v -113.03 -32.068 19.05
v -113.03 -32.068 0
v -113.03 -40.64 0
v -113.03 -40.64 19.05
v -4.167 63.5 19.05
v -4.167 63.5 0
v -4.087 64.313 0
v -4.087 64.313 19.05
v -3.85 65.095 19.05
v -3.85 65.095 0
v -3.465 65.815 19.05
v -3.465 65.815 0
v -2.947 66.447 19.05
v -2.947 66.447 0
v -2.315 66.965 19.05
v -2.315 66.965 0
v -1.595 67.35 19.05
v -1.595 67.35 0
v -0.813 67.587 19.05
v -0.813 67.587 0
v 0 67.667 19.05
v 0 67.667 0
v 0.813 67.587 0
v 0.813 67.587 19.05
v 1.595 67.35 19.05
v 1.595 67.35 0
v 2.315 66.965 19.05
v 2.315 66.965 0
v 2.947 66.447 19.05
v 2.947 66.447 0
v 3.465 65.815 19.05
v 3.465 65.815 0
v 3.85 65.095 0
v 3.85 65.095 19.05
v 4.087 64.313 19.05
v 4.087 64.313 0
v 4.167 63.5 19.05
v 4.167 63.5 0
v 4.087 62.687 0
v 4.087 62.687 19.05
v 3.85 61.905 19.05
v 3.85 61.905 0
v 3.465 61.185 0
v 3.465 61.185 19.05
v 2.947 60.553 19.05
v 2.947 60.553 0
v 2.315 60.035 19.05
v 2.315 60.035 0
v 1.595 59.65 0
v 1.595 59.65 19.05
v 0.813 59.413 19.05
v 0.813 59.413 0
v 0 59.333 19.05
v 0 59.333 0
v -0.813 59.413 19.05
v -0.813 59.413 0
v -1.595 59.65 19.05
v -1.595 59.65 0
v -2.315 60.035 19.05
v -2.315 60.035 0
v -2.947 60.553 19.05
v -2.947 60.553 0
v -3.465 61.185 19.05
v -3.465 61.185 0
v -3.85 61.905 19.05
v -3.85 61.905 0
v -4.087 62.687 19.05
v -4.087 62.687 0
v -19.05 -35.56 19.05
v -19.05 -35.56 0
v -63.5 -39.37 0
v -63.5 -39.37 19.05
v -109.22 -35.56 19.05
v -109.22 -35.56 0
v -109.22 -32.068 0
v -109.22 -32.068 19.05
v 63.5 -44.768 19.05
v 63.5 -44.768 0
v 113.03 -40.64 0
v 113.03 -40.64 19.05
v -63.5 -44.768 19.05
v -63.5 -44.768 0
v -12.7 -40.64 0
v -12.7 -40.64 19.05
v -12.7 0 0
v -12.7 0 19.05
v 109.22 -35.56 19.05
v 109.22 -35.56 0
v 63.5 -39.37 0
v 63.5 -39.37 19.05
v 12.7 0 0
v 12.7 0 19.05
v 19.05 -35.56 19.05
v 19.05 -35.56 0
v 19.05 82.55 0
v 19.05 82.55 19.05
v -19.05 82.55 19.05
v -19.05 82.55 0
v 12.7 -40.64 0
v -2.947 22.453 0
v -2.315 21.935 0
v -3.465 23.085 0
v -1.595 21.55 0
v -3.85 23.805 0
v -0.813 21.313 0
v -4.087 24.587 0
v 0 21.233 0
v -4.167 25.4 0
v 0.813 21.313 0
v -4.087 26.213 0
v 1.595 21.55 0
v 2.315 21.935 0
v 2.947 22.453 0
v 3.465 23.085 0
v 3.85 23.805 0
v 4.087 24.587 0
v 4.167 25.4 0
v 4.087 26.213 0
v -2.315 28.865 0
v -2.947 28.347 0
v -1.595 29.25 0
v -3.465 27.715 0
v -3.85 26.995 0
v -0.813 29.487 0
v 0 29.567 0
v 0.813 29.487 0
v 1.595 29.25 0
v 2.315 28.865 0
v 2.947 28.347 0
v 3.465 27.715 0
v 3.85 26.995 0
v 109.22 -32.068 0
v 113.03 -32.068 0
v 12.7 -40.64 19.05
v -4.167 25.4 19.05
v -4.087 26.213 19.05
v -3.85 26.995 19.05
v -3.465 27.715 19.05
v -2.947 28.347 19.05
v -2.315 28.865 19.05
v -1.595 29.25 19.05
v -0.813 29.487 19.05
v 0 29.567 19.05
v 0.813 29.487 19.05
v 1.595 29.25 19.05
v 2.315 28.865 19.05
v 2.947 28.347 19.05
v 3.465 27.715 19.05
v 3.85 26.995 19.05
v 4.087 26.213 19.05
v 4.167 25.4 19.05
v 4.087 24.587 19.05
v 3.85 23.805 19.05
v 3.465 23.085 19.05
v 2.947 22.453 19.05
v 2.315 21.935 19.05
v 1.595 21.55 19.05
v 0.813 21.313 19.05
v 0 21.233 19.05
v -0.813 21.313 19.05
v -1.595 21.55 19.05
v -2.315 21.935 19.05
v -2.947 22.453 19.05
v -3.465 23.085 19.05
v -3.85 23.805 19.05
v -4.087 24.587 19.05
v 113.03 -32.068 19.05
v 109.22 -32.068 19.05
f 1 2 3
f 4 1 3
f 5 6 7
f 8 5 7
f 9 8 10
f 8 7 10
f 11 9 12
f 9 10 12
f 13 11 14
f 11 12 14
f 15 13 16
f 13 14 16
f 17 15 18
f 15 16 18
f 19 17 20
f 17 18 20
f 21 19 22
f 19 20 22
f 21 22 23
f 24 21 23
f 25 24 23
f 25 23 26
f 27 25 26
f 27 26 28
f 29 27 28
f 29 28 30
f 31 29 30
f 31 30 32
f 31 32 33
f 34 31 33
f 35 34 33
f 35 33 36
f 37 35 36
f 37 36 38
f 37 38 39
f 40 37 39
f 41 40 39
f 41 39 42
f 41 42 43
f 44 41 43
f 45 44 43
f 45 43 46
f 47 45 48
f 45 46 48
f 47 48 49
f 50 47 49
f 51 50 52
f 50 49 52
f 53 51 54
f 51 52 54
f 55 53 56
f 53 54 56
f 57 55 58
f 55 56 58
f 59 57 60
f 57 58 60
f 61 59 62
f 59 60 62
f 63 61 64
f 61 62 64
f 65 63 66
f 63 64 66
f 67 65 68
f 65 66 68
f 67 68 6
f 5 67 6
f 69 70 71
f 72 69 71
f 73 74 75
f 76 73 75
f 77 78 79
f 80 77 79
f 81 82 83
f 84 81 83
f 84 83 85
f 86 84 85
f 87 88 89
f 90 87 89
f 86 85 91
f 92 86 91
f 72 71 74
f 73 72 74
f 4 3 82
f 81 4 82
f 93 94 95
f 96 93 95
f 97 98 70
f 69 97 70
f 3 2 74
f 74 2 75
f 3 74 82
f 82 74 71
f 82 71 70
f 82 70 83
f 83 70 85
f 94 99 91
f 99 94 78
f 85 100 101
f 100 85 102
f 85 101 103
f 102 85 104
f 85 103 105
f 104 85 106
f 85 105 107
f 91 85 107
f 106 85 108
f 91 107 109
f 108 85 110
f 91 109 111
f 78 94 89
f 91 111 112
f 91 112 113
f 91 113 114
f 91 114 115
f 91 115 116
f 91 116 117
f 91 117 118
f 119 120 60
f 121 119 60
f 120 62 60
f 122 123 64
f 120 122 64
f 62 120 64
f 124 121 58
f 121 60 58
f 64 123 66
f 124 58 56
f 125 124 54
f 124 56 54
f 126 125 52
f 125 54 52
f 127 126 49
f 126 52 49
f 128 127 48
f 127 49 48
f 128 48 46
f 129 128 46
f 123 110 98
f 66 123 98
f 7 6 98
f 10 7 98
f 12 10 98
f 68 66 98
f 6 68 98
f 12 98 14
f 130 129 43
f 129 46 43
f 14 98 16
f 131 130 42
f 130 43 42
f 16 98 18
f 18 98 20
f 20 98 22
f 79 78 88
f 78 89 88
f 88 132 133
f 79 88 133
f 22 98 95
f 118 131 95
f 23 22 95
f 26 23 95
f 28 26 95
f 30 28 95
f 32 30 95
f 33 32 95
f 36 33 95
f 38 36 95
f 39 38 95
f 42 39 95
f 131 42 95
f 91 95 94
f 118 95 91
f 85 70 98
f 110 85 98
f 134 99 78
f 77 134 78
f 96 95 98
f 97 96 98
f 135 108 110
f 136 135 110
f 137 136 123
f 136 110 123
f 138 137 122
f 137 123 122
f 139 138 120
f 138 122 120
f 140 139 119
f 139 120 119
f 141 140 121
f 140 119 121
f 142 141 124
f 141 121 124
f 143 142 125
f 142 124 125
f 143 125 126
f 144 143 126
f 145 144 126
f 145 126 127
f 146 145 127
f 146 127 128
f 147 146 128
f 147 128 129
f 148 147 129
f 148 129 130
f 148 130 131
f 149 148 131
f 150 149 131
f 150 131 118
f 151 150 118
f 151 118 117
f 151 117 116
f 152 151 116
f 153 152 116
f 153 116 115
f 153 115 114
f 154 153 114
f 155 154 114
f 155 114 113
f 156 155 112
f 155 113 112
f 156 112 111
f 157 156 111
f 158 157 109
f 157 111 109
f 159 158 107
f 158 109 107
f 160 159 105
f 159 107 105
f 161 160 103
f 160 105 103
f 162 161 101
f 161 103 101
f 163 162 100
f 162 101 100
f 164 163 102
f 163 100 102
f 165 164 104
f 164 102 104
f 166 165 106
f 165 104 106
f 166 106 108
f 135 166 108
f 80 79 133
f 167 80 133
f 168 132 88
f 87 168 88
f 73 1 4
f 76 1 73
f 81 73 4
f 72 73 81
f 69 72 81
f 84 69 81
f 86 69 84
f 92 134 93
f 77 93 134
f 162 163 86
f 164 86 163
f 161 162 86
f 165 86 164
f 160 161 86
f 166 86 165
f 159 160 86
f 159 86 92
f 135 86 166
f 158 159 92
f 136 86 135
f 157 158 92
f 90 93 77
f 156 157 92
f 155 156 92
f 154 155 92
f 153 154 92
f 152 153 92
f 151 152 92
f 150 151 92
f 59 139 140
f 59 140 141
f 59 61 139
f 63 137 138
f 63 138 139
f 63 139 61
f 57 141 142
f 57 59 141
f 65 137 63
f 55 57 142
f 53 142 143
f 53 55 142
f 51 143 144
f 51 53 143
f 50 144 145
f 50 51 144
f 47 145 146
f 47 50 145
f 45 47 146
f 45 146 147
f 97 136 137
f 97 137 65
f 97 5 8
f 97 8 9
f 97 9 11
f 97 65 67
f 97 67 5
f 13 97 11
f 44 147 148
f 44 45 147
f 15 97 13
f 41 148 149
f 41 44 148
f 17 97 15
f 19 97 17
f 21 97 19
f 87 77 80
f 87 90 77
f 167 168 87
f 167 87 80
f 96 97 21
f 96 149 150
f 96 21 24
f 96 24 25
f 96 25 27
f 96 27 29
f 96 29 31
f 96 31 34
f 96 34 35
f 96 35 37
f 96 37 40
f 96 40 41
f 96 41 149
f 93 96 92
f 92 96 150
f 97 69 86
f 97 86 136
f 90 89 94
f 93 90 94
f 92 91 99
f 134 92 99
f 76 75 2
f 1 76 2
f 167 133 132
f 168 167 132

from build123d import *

# Parameters (mm, degrees)
BOSS_EXTRUDE1_DEPTH              = 19.05
F_21_64_0_32813_DIAMETER_HOLE1_D = 8.334502


with BuildPart() as part:
    # Sketch2 → Boss-Extrude1 (new body)
    with BuildSketch(Plane.XY):
        Polygon((0, 0), (12.7, 0), (12.7, -40.64), (63.5, -44.7675), (113.03, -40.64), (113.03, -32.0675), (109.22, -32.0675), (109.22, -35.56), (63.5, -39.37), (19.05, -35.56), (19.05, 0), (19.05, 82.55), (0, 82.55), align=None)
        Polygon((-12.7, 0), (0, 0), (0, 82.55), (-19.05, 82.55), (-19.05, 0), (-19.05, -35.56), (-63.5, -39.37), (-109.22, -35.56), (-109.22, -32.0675), (-113.03, -32.0675), (-113.03, -40.64), (-63.5, -44.7675), (-12.7, -40.64), align=None)
    extrude(amount=BOSS_EXTRUDE1_DEPTH)

    # 21/64 (0.32813) Diameter Hole1 (through all)
    with Locations(Plane.XY.offset(19.05)):
        with Locations((0, 25.4), (0, 63.5)):
            Hole(F_21_64_0_32813_DIAMETER_HOLE1_D / 2)


solid = part.part
